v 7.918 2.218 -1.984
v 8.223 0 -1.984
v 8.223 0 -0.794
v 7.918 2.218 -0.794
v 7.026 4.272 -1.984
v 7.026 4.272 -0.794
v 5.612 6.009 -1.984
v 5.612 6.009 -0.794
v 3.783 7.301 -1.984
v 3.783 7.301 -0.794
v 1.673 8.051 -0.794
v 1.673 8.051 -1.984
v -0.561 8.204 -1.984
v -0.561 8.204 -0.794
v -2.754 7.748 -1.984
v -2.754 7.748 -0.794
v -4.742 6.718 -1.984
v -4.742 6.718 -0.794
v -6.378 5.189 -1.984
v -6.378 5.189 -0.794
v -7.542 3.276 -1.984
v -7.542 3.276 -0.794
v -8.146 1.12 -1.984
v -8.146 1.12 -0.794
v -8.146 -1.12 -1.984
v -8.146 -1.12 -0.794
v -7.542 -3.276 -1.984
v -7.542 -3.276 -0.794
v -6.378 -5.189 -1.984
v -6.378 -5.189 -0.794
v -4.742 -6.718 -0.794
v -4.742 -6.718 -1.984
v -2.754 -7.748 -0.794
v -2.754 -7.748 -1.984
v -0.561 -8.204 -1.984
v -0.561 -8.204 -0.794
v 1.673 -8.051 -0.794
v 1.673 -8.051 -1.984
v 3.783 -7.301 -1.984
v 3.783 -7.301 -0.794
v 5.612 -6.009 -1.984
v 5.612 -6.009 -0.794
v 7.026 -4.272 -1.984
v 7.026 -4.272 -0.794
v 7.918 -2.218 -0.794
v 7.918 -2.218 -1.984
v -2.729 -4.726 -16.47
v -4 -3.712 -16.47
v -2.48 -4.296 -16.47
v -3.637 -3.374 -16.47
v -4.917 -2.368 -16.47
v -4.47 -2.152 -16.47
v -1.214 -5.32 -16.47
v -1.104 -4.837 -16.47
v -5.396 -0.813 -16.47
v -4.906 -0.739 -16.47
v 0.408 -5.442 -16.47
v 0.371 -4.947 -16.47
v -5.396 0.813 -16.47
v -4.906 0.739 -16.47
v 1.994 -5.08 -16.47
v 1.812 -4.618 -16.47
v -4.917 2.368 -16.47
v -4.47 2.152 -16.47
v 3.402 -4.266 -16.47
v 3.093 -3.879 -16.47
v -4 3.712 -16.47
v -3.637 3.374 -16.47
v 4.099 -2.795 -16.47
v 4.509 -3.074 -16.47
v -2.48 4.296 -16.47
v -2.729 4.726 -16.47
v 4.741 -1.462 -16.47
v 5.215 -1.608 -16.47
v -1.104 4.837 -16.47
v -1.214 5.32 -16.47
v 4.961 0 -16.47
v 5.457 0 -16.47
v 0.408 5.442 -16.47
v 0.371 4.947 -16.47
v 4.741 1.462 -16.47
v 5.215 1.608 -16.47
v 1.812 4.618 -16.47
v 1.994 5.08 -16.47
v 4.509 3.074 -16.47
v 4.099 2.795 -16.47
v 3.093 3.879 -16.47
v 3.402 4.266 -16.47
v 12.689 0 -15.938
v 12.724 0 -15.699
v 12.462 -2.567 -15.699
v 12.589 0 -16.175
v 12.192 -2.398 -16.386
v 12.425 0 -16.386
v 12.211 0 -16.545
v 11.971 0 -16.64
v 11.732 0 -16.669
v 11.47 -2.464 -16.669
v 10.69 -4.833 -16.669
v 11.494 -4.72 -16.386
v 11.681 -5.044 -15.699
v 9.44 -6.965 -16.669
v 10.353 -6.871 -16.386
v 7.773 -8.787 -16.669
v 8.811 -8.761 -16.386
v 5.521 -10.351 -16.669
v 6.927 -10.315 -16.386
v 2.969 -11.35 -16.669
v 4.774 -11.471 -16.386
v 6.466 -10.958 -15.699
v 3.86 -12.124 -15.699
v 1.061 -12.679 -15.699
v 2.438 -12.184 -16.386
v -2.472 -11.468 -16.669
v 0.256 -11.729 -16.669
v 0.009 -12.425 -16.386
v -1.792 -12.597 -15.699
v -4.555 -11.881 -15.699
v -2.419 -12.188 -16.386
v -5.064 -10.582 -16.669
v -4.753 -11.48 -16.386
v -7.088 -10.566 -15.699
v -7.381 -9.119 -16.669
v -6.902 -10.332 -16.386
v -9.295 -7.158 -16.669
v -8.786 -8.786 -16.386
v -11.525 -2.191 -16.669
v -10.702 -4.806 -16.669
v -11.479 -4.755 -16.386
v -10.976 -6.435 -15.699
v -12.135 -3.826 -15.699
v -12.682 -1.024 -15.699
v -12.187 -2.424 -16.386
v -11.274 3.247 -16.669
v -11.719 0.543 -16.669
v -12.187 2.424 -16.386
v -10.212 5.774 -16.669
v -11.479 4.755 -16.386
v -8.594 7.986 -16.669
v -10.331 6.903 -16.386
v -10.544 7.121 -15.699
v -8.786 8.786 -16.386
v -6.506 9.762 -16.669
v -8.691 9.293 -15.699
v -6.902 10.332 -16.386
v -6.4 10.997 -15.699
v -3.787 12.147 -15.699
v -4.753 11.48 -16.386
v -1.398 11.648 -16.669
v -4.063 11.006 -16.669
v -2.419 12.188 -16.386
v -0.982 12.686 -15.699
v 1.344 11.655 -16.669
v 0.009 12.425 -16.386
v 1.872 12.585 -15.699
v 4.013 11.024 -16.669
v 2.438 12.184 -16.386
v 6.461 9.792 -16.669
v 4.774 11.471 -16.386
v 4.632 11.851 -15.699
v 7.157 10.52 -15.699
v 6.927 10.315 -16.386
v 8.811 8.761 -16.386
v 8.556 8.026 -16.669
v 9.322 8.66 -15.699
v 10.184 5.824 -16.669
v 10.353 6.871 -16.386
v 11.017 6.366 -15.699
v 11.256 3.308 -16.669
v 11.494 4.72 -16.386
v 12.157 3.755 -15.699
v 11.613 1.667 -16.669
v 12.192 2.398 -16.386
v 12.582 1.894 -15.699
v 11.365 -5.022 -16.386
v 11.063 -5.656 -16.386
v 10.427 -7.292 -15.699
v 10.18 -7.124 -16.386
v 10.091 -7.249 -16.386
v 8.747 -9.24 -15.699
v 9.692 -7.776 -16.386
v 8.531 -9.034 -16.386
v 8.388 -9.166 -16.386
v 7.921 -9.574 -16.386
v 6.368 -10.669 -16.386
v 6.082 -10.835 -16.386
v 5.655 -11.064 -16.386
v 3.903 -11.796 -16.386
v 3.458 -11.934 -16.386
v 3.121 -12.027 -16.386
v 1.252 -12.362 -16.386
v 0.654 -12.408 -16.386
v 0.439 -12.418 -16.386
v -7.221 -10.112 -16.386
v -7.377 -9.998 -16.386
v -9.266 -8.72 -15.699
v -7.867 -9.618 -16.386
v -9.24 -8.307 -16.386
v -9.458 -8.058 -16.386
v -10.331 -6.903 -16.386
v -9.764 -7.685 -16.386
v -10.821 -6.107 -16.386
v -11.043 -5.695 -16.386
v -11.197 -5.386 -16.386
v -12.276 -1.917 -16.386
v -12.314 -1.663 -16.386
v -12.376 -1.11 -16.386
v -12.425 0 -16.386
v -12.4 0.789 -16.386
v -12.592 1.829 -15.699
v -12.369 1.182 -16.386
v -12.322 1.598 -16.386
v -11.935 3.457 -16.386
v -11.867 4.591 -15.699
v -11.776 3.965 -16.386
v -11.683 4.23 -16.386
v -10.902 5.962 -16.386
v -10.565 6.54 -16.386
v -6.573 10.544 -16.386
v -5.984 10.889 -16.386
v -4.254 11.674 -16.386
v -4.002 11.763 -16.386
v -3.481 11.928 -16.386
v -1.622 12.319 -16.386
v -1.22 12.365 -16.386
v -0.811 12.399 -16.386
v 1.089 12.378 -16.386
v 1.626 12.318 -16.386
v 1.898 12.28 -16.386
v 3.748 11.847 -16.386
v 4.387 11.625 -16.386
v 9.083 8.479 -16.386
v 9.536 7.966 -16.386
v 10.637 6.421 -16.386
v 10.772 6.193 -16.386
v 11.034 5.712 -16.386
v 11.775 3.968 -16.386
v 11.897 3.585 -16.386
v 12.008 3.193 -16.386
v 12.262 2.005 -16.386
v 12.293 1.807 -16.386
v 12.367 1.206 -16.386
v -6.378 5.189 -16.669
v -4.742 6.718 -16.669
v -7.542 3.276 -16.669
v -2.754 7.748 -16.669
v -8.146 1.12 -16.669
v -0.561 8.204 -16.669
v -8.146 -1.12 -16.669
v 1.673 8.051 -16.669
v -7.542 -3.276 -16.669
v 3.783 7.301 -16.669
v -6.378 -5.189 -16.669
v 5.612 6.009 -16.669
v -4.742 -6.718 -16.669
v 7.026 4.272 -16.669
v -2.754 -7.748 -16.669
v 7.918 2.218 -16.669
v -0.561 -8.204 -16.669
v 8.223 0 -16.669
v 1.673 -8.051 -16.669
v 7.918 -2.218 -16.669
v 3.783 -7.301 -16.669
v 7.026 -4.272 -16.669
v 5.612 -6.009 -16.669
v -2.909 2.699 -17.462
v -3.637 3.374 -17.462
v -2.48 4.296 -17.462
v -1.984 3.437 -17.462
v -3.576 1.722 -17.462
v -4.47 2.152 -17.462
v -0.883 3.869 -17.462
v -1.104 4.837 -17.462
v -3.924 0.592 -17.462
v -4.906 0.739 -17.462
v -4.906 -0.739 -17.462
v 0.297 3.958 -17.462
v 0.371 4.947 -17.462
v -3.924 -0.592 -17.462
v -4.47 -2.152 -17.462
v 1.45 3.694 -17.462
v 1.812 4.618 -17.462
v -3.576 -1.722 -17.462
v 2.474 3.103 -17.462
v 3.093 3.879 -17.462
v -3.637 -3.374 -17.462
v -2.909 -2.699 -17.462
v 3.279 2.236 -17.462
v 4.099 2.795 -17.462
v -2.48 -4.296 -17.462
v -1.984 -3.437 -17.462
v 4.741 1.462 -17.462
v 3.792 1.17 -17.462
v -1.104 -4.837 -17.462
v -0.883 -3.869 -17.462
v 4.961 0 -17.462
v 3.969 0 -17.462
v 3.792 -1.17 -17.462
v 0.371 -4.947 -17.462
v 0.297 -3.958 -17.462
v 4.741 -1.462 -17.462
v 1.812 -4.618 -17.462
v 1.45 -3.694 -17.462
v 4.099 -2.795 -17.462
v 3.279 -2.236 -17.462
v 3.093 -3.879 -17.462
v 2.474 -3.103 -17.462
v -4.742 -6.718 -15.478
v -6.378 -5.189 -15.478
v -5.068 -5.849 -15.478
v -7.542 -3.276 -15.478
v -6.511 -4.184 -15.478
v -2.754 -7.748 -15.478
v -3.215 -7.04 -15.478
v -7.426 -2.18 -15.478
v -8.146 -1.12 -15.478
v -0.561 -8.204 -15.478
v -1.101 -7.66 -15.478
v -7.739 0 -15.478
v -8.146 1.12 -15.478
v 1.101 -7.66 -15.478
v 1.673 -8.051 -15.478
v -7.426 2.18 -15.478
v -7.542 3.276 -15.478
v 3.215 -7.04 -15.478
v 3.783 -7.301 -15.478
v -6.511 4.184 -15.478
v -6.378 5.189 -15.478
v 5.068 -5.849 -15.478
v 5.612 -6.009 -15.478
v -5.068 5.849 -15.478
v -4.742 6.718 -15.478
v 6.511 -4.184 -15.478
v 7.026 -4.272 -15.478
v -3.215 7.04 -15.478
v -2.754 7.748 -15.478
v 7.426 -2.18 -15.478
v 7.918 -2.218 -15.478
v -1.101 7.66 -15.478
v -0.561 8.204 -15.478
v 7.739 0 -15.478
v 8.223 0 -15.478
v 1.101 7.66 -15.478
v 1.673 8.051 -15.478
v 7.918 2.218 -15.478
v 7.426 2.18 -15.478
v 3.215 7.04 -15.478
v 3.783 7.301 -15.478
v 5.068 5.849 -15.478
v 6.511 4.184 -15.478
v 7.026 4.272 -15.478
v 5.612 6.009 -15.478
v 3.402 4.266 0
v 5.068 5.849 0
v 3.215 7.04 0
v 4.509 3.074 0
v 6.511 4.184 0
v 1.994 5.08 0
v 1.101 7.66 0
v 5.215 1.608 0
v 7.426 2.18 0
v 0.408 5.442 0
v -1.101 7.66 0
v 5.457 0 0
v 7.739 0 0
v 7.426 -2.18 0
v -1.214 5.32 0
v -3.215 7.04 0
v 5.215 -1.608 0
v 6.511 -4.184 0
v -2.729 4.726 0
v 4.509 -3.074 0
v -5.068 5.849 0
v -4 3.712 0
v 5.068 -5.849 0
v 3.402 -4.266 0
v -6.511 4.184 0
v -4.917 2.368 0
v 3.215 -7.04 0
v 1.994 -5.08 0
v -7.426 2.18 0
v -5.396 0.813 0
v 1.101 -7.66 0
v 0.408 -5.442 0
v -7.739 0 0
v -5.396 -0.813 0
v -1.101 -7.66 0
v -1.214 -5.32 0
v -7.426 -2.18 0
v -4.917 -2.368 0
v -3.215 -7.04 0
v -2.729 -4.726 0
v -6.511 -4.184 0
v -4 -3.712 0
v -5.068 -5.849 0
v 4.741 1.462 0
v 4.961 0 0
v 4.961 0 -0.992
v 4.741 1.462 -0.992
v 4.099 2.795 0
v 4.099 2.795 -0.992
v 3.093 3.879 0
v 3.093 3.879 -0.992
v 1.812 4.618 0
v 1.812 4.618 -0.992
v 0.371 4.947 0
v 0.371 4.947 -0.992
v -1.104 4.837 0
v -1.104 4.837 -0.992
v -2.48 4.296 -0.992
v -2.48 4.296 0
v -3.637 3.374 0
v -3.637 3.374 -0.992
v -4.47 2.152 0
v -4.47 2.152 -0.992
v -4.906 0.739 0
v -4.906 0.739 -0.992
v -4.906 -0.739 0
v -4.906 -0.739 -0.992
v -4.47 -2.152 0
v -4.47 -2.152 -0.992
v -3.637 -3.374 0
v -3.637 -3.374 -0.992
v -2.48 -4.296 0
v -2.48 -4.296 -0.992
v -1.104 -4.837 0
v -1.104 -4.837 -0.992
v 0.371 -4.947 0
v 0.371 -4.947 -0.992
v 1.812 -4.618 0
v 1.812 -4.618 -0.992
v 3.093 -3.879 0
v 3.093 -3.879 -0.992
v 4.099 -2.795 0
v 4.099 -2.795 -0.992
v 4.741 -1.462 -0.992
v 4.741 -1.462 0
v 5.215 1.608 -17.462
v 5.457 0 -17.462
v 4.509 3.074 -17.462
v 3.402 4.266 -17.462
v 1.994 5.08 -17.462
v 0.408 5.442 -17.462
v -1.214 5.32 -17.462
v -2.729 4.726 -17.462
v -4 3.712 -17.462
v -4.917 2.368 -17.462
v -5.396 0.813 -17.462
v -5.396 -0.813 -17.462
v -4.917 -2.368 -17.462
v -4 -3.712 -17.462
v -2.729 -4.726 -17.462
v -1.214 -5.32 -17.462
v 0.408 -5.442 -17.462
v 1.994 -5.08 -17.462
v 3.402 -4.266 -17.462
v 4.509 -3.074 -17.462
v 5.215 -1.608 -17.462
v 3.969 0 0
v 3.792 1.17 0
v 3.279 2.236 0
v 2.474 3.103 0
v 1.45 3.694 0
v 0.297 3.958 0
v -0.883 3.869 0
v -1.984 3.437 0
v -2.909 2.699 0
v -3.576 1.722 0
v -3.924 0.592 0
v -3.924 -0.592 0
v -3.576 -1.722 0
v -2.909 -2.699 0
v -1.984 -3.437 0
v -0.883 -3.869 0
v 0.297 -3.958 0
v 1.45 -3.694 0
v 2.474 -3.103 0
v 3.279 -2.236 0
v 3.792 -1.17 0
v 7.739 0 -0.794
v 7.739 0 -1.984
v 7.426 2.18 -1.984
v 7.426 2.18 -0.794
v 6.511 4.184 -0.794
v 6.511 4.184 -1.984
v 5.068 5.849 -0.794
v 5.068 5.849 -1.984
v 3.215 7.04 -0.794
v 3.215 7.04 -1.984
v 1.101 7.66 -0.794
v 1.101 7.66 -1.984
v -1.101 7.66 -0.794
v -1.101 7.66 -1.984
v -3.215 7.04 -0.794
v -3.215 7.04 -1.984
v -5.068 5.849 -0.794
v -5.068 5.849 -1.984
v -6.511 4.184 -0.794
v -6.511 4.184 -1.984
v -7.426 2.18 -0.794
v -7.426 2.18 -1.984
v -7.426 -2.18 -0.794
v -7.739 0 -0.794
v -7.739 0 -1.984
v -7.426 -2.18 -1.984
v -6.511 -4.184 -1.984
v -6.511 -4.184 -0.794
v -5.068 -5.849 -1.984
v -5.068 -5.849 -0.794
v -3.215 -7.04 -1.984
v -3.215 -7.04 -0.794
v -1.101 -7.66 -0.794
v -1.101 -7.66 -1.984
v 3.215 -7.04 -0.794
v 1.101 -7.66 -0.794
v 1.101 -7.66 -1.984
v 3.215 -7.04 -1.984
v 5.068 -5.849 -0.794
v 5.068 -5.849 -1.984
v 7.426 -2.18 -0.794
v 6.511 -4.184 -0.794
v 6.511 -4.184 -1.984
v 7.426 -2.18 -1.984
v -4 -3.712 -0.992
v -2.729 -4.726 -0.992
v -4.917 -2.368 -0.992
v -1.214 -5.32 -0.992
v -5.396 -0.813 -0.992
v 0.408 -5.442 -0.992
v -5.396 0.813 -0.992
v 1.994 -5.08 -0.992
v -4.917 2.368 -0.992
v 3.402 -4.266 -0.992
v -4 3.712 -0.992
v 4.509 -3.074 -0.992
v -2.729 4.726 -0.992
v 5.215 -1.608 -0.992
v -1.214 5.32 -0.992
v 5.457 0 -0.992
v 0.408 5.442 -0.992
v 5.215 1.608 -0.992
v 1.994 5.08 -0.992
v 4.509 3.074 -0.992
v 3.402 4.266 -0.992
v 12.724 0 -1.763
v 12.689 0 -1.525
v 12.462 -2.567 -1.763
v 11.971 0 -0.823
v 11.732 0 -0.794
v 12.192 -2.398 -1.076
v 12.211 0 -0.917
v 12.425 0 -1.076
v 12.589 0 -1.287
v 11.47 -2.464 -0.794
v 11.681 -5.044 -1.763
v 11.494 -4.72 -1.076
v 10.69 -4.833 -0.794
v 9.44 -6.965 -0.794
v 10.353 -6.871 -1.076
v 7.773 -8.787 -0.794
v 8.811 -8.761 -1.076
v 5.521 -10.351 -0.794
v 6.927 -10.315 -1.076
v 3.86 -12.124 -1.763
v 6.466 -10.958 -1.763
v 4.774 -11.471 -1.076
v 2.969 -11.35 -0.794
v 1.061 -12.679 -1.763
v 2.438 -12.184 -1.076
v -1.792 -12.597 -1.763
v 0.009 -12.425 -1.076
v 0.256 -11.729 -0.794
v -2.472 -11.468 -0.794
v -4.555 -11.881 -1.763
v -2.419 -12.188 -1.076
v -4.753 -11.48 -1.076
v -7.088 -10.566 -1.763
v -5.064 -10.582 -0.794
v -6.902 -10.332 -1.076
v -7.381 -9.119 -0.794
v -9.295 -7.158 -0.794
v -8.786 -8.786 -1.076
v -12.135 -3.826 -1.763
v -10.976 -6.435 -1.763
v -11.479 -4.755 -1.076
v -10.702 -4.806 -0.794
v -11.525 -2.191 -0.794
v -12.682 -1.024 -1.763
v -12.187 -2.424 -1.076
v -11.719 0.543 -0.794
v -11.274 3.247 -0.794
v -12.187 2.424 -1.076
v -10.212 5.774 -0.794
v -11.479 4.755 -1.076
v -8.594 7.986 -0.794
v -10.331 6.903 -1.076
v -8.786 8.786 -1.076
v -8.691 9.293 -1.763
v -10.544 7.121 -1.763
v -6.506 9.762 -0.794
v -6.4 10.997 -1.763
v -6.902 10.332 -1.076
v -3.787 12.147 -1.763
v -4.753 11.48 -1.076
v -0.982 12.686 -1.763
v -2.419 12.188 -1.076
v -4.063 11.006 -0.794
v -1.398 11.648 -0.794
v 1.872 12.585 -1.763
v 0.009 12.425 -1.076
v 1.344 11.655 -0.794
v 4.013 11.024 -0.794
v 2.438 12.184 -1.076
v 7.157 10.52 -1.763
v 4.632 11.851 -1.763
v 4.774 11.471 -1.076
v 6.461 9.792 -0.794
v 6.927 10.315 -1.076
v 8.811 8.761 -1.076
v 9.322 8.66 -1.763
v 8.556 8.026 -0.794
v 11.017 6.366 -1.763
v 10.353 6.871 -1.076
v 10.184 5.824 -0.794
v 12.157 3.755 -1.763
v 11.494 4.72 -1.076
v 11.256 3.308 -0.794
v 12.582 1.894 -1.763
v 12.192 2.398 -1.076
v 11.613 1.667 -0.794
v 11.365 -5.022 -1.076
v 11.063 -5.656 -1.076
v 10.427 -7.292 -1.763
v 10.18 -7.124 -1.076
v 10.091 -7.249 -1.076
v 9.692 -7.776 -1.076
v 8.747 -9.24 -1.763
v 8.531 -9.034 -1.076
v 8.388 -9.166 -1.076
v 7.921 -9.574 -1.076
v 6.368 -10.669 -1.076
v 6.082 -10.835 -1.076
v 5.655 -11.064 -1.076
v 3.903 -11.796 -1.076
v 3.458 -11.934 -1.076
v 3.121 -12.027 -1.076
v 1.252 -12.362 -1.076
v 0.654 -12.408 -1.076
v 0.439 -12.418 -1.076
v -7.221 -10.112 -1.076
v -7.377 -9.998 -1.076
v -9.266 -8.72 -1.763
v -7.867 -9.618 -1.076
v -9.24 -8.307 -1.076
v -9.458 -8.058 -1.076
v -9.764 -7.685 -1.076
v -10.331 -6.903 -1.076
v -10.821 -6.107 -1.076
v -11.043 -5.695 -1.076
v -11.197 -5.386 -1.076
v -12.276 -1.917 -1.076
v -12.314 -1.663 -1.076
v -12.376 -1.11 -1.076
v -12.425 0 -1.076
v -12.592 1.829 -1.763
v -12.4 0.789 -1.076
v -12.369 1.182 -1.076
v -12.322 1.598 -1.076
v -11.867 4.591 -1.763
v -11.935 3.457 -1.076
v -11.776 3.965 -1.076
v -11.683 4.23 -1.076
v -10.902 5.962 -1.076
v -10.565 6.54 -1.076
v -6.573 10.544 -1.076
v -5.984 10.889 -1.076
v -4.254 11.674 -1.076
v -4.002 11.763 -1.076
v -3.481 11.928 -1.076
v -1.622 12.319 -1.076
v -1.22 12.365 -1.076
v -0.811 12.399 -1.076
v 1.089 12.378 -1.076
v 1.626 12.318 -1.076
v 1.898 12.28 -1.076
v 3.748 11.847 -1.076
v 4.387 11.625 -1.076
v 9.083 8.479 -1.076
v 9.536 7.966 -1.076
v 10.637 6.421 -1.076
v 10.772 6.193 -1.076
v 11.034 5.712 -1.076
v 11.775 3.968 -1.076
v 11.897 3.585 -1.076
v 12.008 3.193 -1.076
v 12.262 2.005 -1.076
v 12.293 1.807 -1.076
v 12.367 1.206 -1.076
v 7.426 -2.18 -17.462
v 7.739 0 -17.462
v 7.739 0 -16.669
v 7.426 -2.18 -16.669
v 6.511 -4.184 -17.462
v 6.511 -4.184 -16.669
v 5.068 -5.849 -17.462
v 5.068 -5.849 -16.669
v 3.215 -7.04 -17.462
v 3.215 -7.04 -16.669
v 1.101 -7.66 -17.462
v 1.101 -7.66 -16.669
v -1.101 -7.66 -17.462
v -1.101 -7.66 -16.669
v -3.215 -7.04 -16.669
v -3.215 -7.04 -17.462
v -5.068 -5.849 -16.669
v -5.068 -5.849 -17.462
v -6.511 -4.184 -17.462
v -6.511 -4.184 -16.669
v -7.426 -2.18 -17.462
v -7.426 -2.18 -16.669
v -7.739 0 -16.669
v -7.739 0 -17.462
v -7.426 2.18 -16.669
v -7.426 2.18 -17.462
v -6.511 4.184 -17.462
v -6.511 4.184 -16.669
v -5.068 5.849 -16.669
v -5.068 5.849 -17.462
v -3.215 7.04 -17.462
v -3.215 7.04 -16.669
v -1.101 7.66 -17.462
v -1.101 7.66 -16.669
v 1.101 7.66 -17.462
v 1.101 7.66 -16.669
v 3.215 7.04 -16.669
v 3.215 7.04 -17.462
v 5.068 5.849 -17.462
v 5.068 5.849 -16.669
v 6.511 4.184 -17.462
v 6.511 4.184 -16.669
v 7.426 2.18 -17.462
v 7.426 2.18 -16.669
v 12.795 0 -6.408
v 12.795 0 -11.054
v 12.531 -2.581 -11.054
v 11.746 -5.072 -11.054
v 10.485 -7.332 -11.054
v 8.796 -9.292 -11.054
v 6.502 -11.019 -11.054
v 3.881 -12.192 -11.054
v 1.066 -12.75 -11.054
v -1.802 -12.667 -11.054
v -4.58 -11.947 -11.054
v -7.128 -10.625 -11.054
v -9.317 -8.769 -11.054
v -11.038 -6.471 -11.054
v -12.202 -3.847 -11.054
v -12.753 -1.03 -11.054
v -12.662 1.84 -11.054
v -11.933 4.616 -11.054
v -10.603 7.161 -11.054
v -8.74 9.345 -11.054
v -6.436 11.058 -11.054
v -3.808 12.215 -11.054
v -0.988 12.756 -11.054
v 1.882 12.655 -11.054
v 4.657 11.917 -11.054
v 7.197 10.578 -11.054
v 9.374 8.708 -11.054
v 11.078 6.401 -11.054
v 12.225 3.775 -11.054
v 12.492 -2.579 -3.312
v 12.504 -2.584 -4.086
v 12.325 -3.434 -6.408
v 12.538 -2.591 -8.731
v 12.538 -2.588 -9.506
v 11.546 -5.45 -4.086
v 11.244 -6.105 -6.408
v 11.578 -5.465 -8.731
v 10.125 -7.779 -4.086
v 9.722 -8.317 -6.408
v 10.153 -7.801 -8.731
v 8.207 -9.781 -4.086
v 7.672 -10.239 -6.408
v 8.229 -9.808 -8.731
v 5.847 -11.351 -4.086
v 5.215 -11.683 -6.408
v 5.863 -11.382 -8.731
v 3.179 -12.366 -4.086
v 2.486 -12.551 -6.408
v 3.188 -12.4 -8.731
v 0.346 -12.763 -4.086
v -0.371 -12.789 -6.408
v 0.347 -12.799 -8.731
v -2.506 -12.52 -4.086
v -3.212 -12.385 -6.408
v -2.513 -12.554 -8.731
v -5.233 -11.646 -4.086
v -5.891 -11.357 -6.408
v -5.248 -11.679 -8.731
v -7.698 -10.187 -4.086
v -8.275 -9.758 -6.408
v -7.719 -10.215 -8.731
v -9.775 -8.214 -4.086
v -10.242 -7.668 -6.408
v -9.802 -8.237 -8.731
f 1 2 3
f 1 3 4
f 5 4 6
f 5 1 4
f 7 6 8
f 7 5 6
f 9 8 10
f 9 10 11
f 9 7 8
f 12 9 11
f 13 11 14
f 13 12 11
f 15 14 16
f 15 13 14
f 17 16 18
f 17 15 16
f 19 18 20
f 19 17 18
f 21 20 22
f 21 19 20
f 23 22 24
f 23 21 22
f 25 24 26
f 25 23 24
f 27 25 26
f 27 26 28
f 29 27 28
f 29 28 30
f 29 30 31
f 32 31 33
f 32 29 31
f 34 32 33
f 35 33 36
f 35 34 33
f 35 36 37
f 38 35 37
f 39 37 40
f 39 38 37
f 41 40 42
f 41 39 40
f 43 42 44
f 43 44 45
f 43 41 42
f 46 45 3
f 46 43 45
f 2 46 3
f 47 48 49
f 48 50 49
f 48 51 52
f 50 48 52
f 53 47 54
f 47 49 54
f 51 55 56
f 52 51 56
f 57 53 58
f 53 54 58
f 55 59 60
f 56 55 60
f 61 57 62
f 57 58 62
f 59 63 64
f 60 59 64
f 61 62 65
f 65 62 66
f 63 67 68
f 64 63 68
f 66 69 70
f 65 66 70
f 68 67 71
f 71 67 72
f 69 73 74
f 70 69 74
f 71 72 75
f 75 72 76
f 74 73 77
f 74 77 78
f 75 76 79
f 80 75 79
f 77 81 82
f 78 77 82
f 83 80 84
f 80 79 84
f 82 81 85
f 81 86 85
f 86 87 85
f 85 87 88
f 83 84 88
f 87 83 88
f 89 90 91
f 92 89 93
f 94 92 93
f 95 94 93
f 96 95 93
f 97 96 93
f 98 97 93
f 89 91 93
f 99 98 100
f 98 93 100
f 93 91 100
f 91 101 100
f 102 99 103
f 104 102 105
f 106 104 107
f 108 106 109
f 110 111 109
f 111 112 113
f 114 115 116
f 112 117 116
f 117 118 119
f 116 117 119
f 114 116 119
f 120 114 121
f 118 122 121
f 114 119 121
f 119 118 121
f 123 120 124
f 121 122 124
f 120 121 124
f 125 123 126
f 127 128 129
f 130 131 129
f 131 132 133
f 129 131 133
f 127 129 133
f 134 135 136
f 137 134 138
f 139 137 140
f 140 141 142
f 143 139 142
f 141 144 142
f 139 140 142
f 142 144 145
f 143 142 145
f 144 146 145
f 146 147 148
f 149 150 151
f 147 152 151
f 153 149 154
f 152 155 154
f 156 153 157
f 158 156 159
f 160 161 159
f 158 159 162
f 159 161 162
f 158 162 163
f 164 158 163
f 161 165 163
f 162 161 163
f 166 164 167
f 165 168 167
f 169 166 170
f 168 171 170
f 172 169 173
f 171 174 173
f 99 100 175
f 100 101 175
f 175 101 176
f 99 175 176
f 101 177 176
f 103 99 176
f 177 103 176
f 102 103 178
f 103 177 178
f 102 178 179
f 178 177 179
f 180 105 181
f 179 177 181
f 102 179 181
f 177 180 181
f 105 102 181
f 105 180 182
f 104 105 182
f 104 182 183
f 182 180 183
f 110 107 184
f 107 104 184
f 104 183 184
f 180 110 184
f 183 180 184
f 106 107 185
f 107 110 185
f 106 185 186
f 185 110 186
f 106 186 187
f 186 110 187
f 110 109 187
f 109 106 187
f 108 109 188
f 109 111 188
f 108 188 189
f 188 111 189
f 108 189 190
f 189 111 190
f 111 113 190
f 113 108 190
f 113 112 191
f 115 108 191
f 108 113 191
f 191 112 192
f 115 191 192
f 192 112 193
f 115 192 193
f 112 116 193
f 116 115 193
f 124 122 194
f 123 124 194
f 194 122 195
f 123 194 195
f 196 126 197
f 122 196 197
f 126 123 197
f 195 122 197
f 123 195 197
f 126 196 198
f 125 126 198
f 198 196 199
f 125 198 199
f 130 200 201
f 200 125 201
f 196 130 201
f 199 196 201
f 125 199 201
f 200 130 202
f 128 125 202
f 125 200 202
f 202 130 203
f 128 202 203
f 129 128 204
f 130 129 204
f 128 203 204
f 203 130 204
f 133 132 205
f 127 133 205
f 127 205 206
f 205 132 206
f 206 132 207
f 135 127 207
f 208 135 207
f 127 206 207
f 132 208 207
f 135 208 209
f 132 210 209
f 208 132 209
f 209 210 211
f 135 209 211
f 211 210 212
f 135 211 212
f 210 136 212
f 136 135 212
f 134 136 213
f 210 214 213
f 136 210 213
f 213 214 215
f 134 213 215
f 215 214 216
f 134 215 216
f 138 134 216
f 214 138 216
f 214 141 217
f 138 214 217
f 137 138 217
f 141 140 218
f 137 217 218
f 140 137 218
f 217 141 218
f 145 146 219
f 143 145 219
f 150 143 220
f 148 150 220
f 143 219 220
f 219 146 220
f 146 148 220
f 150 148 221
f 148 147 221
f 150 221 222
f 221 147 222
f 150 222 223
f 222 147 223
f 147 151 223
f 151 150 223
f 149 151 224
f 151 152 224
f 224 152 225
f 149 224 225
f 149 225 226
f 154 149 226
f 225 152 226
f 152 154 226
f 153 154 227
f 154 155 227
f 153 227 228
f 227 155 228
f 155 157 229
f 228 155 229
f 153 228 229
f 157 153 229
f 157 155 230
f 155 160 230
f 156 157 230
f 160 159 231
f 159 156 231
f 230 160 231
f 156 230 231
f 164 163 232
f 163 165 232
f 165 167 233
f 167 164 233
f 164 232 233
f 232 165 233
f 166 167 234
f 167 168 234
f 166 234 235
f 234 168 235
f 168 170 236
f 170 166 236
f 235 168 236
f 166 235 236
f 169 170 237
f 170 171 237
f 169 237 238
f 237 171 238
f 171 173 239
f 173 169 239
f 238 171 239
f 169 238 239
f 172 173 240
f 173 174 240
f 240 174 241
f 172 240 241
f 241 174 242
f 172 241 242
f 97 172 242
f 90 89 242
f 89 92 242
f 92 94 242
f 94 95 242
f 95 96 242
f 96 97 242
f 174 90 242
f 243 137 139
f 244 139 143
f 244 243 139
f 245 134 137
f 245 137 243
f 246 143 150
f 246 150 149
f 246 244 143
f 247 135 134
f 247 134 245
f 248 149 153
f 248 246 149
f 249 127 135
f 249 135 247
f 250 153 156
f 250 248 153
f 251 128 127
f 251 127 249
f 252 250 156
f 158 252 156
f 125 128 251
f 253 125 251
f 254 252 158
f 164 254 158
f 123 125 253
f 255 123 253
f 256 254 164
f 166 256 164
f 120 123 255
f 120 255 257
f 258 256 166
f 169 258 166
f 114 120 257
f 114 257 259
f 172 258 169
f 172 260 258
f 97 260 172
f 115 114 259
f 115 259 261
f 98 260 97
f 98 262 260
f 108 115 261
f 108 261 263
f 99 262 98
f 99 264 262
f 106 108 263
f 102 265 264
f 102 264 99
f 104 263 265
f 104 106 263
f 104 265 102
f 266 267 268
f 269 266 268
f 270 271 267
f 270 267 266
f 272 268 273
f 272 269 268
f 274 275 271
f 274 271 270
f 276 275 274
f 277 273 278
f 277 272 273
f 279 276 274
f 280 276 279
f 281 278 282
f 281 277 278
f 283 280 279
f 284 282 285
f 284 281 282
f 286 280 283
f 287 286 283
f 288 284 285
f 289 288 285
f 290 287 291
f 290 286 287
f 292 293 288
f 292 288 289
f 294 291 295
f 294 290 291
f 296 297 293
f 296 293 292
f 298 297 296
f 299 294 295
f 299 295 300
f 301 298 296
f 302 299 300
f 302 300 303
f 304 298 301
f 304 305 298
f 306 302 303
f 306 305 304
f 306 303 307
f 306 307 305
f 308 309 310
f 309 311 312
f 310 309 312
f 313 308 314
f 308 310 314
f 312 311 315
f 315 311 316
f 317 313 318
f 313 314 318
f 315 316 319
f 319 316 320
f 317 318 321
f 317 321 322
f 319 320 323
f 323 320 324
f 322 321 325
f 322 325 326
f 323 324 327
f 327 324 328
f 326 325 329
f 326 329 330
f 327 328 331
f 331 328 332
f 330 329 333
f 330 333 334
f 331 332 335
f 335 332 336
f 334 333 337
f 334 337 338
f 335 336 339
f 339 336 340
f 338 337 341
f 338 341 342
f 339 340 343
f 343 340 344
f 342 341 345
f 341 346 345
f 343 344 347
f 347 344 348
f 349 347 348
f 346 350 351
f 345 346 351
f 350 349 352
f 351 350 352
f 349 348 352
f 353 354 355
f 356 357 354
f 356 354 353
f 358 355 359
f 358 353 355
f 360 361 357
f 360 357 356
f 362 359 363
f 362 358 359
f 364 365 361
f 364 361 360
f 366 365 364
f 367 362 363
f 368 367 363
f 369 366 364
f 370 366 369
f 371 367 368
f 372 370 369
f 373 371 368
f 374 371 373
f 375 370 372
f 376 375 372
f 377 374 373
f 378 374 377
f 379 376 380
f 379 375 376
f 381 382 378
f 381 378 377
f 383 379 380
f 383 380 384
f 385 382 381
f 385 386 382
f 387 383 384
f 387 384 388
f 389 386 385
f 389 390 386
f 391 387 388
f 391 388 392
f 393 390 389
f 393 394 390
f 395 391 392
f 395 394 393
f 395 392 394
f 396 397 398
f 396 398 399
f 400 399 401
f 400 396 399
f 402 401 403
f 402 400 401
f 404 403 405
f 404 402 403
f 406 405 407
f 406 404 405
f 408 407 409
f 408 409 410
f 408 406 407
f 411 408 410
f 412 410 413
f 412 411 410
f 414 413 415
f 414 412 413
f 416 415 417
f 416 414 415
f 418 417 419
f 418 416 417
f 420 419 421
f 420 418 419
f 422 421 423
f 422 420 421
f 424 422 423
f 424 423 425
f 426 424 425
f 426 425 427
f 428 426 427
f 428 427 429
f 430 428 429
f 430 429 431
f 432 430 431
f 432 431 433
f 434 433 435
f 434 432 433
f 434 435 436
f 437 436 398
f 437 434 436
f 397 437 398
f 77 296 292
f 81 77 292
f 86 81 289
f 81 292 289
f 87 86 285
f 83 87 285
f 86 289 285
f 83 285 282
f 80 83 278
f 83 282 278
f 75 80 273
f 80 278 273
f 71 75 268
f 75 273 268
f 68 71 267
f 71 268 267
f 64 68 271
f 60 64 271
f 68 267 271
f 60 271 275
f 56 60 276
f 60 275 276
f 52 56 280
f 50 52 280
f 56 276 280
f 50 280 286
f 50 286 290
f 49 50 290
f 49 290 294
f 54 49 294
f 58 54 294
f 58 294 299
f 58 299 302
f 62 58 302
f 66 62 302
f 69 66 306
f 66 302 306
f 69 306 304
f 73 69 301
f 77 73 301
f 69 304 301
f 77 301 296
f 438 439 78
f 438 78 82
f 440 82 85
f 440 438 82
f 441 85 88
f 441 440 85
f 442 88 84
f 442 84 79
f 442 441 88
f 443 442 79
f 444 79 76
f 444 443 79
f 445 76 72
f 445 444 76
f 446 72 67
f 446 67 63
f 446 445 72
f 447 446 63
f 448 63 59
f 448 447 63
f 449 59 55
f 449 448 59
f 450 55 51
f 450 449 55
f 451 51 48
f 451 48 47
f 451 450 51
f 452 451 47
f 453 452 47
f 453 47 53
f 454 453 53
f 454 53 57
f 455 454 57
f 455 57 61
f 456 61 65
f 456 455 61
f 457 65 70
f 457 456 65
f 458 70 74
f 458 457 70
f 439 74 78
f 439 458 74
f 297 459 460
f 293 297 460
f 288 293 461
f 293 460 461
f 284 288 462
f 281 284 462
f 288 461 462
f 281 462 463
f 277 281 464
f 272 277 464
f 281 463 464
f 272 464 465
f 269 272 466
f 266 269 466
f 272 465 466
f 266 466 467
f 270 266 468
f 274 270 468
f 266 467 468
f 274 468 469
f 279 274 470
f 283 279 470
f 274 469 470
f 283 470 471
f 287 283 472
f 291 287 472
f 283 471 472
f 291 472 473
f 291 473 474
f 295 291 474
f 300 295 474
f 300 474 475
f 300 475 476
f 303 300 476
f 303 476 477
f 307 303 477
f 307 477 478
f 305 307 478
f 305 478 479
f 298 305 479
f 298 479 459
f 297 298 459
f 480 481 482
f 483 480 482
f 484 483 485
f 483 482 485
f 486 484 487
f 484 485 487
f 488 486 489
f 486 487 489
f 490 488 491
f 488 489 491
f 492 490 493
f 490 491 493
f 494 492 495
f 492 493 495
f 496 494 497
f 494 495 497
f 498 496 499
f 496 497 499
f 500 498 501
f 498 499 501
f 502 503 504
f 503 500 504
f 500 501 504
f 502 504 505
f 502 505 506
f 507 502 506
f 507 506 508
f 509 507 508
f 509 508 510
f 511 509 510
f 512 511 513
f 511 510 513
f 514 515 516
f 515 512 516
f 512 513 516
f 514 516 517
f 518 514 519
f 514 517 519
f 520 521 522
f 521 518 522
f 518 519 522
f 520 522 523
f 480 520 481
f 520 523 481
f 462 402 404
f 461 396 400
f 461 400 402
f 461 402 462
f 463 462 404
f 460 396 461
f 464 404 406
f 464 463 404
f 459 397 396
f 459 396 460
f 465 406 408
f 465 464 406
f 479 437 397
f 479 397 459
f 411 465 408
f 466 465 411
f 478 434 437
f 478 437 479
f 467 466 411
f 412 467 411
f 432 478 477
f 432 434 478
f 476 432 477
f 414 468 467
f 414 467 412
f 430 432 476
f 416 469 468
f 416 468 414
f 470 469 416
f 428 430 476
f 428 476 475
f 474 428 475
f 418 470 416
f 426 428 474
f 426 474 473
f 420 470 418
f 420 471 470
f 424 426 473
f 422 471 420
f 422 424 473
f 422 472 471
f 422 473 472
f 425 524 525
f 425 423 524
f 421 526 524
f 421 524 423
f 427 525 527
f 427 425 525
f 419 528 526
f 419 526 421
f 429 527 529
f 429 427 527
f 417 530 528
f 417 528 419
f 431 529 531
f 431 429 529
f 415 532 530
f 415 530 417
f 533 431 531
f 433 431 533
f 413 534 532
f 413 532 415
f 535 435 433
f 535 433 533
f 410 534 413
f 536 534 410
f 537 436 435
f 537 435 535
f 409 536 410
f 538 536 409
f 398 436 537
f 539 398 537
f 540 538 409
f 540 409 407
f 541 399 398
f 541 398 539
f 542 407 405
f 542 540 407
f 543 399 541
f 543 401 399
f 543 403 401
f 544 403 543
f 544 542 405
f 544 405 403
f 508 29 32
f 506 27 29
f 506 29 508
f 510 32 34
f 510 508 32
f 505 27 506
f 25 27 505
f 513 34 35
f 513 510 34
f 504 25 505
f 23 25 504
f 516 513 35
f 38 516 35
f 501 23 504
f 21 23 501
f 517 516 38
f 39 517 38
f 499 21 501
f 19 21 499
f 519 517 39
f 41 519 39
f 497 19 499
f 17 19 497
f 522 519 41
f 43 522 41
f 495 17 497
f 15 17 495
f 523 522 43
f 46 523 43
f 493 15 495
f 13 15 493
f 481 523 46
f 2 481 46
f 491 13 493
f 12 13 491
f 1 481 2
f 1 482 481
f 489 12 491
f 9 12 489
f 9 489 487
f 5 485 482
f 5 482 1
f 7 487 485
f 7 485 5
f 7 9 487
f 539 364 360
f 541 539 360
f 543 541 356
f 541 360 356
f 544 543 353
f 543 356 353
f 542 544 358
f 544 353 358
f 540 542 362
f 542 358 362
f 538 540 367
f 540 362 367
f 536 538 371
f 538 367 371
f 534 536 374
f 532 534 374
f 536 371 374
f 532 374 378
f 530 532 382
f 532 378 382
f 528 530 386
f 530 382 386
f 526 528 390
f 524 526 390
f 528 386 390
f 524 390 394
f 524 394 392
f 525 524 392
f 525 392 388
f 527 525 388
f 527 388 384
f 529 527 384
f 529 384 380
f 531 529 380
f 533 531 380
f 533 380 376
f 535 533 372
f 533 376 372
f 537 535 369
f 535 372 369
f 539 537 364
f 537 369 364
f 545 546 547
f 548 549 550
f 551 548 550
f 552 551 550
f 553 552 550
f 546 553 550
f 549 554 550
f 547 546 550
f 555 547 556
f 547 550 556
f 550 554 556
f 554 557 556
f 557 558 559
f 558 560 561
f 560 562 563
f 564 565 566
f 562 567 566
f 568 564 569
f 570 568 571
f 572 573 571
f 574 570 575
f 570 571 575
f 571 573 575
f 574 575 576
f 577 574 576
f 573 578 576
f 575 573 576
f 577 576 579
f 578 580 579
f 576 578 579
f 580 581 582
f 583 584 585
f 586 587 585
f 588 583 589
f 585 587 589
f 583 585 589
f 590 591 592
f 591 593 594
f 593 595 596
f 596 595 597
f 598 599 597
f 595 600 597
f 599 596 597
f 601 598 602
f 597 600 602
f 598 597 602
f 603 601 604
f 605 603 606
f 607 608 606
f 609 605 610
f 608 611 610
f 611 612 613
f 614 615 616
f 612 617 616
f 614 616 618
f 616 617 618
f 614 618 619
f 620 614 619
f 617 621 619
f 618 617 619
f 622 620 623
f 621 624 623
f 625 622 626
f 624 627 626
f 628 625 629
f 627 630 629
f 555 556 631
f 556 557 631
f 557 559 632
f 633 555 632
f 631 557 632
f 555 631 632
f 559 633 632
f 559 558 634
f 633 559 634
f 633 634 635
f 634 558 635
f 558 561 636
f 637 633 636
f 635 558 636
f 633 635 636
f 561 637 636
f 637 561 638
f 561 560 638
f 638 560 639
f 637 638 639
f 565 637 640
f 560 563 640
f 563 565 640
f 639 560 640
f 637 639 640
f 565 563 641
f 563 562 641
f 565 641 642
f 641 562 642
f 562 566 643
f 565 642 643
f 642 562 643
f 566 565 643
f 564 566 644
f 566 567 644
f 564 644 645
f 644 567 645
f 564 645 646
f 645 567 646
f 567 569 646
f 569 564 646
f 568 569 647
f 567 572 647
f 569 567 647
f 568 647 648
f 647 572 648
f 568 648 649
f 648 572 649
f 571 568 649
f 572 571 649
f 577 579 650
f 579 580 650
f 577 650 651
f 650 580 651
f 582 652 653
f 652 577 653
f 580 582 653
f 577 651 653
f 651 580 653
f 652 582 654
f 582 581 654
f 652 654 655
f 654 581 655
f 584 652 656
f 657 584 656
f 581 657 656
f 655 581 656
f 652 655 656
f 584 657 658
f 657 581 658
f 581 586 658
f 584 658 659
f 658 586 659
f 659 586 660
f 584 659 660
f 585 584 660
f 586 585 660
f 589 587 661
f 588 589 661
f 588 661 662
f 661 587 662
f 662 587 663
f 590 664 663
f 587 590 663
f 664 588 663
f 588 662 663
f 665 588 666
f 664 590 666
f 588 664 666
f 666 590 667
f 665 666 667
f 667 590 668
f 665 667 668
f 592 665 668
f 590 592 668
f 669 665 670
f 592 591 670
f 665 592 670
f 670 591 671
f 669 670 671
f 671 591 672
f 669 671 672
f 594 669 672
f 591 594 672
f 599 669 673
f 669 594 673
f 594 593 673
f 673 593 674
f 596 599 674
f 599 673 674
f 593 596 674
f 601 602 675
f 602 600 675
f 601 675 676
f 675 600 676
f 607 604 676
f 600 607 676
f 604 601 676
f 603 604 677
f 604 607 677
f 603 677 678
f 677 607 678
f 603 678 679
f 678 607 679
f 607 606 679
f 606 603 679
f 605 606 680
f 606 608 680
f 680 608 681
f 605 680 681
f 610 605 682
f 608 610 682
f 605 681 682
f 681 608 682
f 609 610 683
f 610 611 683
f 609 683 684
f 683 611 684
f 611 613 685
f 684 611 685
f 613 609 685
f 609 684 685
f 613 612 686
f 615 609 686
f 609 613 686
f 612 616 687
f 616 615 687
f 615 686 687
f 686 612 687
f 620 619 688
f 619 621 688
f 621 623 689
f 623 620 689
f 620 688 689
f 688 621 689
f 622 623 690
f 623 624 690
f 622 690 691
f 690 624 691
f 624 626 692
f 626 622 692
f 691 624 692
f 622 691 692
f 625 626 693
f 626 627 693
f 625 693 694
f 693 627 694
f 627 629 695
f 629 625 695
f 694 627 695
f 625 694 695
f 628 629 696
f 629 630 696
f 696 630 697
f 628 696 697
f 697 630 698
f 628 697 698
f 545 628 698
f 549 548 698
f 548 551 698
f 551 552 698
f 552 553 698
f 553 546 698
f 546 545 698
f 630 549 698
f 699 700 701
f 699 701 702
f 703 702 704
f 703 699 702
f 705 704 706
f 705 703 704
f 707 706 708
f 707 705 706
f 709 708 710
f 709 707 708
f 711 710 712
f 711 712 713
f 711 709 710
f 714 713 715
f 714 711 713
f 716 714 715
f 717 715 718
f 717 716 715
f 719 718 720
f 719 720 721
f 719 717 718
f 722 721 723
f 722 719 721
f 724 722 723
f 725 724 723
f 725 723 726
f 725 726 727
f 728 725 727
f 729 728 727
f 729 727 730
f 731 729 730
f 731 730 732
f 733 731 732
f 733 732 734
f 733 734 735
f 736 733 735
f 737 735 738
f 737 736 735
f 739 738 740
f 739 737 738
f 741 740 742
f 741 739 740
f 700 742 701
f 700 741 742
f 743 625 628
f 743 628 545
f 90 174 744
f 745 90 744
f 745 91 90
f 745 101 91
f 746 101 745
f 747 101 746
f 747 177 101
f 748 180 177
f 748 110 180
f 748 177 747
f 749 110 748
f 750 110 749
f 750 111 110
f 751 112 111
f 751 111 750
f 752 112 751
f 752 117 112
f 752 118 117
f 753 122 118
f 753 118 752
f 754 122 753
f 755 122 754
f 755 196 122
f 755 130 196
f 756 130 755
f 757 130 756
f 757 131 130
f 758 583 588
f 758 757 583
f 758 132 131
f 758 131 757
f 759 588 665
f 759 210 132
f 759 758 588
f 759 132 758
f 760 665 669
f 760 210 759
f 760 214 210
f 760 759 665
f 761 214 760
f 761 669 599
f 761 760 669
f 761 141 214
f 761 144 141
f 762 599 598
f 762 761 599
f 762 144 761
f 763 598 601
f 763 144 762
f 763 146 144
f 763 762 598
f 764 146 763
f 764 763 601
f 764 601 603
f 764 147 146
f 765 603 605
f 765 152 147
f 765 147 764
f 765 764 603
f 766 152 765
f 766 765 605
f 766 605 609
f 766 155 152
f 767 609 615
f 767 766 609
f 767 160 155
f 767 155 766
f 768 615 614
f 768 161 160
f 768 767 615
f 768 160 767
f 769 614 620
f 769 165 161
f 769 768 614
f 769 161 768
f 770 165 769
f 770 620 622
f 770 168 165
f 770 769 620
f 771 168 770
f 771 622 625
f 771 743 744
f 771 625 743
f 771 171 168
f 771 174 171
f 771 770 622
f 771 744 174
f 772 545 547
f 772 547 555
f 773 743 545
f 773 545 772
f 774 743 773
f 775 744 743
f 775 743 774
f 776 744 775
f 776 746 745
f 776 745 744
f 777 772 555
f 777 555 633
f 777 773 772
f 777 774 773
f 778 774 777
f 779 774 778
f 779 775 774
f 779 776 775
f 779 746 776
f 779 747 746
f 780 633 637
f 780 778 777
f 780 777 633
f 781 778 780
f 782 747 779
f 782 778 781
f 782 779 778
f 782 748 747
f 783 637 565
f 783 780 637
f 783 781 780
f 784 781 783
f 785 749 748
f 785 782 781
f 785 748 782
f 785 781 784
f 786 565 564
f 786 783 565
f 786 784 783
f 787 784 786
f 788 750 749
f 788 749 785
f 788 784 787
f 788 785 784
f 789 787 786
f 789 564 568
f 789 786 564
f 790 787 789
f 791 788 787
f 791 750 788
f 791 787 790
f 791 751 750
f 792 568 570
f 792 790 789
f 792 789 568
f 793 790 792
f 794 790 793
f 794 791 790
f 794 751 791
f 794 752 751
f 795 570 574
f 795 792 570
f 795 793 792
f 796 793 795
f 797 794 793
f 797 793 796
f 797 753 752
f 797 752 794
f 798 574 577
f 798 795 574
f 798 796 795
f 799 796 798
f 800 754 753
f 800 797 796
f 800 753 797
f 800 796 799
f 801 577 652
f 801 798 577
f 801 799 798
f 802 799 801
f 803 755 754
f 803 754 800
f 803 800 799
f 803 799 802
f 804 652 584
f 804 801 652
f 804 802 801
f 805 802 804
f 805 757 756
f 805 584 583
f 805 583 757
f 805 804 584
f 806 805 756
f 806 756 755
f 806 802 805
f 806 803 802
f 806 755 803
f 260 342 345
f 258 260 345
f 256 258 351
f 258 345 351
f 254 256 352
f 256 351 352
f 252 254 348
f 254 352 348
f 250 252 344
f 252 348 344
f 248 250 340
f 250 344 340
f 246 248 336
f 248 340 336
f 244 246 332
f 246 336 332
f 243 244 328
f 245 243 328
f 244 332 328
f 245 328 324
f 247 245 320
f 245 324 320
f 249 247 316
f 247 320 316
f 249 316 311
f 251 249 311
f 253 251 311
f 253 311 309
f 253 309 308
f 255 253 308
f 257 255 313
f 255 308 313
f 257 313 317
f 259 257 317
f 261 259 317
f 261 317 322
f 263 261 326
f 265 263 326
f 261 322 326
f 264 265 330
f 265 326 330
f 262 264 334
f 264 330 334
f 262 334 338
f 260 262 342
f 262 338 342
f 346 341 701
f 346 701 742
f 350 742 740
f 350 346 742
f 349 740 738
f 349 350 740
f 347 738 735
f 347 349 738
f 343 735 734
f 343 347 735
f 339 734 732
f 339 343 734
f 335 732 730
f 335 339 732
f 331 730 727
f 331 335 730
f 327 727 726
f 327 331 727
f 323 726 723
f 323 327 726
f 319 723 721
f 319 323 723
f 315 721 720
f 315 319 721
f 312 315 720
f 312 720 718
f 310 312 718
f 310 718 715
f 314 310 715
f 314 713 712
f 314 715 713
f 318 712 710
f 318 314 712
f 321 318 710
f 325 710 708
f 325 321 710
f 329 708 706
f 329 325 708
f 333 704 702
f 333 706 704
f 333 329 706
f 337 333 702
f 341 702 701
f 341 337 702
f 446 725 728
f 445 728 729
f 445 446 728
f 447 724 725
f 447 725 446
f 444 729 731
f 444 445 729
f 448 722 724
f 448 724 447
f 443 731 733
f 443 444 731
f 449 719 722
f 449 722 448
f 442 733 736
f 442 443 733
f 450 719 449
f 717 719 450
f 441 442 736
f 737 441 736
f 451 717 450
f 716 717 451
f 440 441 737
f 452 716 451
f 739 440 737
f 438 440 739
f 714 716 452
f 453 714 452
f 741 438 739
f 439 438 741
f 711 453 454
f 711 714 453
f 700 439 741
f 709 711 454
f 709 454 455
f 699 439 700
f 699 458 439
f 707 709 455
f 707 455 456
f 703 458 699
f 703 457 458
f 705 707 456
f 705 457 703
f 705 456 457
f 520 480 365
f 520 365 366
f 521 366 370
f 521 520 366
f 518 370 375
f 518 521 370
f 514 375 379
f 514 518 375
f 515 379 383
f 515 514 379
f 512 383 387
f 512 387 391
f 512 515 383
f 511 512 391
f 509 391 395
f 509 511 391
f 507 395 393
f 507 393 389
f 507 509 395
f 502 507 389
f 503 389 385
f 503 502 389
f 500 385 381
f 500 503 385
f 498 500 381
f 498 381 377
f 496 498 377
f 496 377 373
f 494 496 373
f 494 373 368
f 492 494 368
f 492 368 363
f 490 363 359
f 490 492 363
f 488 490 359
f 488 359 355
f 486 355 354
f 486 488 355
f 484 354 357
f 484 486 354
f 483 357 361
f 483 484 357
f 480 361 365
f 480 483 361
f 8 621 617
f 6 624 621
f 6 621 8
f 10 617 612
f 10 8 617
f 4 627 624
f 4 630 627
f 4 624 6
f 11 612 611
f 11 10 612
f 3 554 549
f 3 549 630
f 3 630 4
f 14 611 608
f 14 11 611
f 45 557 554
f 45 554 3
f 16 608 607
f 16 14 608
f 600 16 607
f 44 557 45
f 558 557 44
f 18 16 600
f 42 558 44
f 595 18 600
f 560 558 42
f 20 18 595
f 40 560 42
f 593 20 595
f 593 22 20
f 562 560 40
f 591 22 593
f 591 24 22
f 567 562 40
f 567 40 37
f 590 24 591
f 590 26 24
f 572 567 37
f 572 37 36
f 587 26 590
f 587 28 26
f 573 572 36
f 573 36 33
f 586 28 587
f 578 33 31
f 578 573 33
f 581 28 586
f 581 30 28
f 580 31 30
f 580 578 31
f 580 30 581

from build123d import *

# Parameters (mm, degrees)
SKETCH2_R          = 3.96875
CUT_EXTRUDE1_DEPTH = 26.155347309
SKETCH3_R          = 5.45703125
SKETCH3_R_2        = 4.9609375
CUT_EXTRUDE2_DEPTH = 0.992188
CUT_EXTRUDE3_START = -1.190625
SKETCH4_R          = 8.222753906
SKETCH4_R_2        = 7.7390625
CUT_EXTRUDE3_DEPTH = 1.190625
FILLET1_R          = 0.9921875


with BuildPart() as part:
    # Sketch1 → Revolve1 (revolve)
    with BuildSketch(Plane(origin=(0, 0, 0), x_dir=(0, 0, -1), z_dir=(1, 0, 0)), mode=Mode.PRIVATE) as revolve1_sk:
        with BuildLine():
            Line((0, 7.7390625), (0.79375, 7.7390625))
            Line((0.79375, 7.7390625), (0.79375, 12.7))
            ThreePointArc((0.79375, 12.7), (8.73125, 12.803370393), (16.66875, 12.7))
            Line((16.66875, 12.7), (16.66875, 7.7390625))
            Line((16.66875, 7.7390625), (17.4625, 7.7390625))
            Line((17.4625, 7.7390625), (17.4625, 0))
            Line((17.4625, 0), (0, 0))
            Line((0, 0), (0, 7.7390625))
        make_face()
    revolve(revolve1_sk.sketch.rotate(Axis((0, 0, 0), (0, 0, -1)), 90), axis=Axis((0, 0, 0), (0, 0, -1)))

    # Sketch2 → Cut-Extrude1 (cut, through all)
    with BuildSketch(Plane.XY):
        Circle(SKETCH2_R)
    extrude(amount=-CUT_EXTRUDE1_DEPTH, mode=Mode.SUBTRACT)

    # Sketch3 → Cut-Extrude2 (cut)
    with BuildSketch(Plane.XY):
        Circle(SKETCH3_R)
        Circle(SKETCH3_R_2, mode=Mode.SUBTRACT)
    cut_extrude2 = extrude(amount=-CUT_EXTRUDE2_DEPTH, mode=Mode.SUBTRACT)

    # Sketch4 → Cut-Extrude3 (cut)
    with BuildSketch(Plane.XY.offset(-0.79375).offset(CUT_EXTRUDE3_START)):
        Circle(SKETCH4_R)
        Circle(SKETCH4_R_2, mode=Mode.SUBTRACT)
    cut_extrude3 = extrude(amount=CUT_EXTRUDE3_DEPTH, mode=Mode.SUBTRACT)

    # Fillet1
    fillet1_edges = [part.edges().sort_by_distance(p)[0] for p in [
        (-12.7, 0, -16.66875),
        (-12.7, 0, -0.79375),
    ]]
    fillet(fillet1_edges, radius=FILLET1_R)

    # Mirror1: Cut-Extrude2, Cut-Extrude3 across plane
    add(cut_extrude2.mirror(Plane.XY.offset(-8.73125)), mode=Mode.SUBTRACT)
    add(cut_extrude3.mirror(Plane.XY.offset(-8.73125)), mode=Mode.SUBTRACT)


solid = part.part
